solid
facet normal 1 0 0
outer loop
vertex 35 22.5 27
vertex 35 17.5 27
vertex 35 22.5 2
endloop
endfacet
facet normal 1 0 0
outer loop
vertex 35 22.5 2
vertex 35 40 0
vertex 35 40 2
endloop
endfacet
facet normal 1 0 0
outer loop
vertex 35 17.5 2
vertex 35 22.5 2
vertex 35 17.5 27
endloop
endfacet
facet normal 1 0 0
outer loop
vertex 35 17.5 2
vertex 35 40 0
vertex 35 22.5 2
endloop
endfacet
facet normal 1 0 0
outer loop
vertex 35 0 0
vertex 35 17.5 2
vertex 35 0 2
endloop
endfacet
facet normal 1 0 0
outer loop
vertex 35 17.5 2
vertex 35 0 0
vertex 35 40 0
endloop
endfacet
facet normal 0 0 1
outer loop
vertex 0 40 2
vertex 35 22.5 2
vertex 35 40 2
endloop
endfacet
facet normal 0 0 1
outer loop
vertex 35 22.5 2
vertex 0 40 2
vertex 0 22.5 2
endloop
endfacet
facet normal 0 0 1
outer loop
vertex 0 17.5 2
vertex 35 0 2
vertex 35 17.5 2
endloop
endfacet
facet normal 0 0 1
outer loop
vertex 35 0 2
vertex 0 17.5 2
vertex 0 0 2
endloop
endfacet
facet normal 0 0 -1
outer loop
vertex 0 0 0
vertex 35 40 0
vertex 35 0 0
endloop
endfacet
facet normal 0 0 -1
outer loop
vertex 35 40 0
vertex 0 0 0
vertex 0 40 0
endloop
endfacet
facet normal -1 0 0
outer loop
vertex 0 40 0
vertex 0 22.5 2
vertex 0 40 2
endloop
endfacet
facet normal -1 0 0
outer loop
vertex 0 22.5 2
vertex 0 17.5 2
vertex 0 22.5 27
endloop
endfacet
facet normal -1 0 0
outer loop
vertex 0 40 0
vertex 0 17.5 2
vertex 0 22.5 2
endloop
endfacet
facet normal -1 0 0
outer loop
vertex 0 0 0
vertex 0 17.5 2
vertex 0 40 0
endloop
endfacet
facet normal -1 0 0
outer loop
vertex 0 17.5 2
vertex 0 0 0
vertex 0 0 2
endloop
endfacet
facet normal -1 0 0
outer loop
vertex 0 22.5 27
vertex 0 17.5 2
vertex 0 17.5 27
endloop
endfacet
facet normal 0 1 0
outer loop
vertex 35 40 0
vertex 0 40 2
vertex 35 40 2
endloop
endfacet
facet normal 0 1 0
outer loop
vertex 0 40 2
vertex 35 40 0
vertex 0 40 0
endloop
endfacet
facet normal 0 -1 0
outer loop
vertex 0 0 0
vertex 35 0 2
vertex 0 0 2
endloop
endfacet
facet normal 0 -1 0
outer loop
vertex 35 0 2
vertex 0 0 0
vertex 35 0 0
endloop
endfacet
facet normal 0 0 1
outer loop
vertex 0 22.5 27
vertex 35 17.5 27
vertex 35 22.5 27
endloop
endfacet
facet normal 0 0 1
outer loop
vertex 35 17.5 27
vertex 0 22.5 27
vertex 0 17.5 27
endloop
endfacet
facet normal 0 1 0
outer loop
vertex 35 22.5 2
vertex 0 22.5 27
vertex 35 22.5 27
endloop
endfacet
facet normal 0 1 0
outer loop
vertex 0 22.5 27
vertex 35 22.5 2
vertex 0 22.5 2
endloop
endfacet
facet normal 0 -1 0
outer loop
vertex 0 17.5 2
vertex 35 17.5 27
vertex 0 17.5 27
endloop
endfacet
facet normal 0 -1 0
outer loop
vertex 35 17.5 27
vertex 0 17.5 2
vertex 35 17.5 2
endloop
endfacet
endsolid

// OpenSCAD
DECKING_HEIGHT = 27;
DECKING_SPACING = 5;

GUIDE_THICKNESS = 2;
GUIDE_WIDTH = 40;
GUIDE_HEIGHT=35;

$fn = 40;

cube([GUIDE_HEIGHT, GUIDE_WIDTH, GUIDE_THICKNESS]);
translate([0, GUIDE_WIDTH/2 - DECKING_SPACING/2, 0]) cube([GUIDE_HEIGHT, DECKING_SPACING, DECKING_HEIGHT]);
